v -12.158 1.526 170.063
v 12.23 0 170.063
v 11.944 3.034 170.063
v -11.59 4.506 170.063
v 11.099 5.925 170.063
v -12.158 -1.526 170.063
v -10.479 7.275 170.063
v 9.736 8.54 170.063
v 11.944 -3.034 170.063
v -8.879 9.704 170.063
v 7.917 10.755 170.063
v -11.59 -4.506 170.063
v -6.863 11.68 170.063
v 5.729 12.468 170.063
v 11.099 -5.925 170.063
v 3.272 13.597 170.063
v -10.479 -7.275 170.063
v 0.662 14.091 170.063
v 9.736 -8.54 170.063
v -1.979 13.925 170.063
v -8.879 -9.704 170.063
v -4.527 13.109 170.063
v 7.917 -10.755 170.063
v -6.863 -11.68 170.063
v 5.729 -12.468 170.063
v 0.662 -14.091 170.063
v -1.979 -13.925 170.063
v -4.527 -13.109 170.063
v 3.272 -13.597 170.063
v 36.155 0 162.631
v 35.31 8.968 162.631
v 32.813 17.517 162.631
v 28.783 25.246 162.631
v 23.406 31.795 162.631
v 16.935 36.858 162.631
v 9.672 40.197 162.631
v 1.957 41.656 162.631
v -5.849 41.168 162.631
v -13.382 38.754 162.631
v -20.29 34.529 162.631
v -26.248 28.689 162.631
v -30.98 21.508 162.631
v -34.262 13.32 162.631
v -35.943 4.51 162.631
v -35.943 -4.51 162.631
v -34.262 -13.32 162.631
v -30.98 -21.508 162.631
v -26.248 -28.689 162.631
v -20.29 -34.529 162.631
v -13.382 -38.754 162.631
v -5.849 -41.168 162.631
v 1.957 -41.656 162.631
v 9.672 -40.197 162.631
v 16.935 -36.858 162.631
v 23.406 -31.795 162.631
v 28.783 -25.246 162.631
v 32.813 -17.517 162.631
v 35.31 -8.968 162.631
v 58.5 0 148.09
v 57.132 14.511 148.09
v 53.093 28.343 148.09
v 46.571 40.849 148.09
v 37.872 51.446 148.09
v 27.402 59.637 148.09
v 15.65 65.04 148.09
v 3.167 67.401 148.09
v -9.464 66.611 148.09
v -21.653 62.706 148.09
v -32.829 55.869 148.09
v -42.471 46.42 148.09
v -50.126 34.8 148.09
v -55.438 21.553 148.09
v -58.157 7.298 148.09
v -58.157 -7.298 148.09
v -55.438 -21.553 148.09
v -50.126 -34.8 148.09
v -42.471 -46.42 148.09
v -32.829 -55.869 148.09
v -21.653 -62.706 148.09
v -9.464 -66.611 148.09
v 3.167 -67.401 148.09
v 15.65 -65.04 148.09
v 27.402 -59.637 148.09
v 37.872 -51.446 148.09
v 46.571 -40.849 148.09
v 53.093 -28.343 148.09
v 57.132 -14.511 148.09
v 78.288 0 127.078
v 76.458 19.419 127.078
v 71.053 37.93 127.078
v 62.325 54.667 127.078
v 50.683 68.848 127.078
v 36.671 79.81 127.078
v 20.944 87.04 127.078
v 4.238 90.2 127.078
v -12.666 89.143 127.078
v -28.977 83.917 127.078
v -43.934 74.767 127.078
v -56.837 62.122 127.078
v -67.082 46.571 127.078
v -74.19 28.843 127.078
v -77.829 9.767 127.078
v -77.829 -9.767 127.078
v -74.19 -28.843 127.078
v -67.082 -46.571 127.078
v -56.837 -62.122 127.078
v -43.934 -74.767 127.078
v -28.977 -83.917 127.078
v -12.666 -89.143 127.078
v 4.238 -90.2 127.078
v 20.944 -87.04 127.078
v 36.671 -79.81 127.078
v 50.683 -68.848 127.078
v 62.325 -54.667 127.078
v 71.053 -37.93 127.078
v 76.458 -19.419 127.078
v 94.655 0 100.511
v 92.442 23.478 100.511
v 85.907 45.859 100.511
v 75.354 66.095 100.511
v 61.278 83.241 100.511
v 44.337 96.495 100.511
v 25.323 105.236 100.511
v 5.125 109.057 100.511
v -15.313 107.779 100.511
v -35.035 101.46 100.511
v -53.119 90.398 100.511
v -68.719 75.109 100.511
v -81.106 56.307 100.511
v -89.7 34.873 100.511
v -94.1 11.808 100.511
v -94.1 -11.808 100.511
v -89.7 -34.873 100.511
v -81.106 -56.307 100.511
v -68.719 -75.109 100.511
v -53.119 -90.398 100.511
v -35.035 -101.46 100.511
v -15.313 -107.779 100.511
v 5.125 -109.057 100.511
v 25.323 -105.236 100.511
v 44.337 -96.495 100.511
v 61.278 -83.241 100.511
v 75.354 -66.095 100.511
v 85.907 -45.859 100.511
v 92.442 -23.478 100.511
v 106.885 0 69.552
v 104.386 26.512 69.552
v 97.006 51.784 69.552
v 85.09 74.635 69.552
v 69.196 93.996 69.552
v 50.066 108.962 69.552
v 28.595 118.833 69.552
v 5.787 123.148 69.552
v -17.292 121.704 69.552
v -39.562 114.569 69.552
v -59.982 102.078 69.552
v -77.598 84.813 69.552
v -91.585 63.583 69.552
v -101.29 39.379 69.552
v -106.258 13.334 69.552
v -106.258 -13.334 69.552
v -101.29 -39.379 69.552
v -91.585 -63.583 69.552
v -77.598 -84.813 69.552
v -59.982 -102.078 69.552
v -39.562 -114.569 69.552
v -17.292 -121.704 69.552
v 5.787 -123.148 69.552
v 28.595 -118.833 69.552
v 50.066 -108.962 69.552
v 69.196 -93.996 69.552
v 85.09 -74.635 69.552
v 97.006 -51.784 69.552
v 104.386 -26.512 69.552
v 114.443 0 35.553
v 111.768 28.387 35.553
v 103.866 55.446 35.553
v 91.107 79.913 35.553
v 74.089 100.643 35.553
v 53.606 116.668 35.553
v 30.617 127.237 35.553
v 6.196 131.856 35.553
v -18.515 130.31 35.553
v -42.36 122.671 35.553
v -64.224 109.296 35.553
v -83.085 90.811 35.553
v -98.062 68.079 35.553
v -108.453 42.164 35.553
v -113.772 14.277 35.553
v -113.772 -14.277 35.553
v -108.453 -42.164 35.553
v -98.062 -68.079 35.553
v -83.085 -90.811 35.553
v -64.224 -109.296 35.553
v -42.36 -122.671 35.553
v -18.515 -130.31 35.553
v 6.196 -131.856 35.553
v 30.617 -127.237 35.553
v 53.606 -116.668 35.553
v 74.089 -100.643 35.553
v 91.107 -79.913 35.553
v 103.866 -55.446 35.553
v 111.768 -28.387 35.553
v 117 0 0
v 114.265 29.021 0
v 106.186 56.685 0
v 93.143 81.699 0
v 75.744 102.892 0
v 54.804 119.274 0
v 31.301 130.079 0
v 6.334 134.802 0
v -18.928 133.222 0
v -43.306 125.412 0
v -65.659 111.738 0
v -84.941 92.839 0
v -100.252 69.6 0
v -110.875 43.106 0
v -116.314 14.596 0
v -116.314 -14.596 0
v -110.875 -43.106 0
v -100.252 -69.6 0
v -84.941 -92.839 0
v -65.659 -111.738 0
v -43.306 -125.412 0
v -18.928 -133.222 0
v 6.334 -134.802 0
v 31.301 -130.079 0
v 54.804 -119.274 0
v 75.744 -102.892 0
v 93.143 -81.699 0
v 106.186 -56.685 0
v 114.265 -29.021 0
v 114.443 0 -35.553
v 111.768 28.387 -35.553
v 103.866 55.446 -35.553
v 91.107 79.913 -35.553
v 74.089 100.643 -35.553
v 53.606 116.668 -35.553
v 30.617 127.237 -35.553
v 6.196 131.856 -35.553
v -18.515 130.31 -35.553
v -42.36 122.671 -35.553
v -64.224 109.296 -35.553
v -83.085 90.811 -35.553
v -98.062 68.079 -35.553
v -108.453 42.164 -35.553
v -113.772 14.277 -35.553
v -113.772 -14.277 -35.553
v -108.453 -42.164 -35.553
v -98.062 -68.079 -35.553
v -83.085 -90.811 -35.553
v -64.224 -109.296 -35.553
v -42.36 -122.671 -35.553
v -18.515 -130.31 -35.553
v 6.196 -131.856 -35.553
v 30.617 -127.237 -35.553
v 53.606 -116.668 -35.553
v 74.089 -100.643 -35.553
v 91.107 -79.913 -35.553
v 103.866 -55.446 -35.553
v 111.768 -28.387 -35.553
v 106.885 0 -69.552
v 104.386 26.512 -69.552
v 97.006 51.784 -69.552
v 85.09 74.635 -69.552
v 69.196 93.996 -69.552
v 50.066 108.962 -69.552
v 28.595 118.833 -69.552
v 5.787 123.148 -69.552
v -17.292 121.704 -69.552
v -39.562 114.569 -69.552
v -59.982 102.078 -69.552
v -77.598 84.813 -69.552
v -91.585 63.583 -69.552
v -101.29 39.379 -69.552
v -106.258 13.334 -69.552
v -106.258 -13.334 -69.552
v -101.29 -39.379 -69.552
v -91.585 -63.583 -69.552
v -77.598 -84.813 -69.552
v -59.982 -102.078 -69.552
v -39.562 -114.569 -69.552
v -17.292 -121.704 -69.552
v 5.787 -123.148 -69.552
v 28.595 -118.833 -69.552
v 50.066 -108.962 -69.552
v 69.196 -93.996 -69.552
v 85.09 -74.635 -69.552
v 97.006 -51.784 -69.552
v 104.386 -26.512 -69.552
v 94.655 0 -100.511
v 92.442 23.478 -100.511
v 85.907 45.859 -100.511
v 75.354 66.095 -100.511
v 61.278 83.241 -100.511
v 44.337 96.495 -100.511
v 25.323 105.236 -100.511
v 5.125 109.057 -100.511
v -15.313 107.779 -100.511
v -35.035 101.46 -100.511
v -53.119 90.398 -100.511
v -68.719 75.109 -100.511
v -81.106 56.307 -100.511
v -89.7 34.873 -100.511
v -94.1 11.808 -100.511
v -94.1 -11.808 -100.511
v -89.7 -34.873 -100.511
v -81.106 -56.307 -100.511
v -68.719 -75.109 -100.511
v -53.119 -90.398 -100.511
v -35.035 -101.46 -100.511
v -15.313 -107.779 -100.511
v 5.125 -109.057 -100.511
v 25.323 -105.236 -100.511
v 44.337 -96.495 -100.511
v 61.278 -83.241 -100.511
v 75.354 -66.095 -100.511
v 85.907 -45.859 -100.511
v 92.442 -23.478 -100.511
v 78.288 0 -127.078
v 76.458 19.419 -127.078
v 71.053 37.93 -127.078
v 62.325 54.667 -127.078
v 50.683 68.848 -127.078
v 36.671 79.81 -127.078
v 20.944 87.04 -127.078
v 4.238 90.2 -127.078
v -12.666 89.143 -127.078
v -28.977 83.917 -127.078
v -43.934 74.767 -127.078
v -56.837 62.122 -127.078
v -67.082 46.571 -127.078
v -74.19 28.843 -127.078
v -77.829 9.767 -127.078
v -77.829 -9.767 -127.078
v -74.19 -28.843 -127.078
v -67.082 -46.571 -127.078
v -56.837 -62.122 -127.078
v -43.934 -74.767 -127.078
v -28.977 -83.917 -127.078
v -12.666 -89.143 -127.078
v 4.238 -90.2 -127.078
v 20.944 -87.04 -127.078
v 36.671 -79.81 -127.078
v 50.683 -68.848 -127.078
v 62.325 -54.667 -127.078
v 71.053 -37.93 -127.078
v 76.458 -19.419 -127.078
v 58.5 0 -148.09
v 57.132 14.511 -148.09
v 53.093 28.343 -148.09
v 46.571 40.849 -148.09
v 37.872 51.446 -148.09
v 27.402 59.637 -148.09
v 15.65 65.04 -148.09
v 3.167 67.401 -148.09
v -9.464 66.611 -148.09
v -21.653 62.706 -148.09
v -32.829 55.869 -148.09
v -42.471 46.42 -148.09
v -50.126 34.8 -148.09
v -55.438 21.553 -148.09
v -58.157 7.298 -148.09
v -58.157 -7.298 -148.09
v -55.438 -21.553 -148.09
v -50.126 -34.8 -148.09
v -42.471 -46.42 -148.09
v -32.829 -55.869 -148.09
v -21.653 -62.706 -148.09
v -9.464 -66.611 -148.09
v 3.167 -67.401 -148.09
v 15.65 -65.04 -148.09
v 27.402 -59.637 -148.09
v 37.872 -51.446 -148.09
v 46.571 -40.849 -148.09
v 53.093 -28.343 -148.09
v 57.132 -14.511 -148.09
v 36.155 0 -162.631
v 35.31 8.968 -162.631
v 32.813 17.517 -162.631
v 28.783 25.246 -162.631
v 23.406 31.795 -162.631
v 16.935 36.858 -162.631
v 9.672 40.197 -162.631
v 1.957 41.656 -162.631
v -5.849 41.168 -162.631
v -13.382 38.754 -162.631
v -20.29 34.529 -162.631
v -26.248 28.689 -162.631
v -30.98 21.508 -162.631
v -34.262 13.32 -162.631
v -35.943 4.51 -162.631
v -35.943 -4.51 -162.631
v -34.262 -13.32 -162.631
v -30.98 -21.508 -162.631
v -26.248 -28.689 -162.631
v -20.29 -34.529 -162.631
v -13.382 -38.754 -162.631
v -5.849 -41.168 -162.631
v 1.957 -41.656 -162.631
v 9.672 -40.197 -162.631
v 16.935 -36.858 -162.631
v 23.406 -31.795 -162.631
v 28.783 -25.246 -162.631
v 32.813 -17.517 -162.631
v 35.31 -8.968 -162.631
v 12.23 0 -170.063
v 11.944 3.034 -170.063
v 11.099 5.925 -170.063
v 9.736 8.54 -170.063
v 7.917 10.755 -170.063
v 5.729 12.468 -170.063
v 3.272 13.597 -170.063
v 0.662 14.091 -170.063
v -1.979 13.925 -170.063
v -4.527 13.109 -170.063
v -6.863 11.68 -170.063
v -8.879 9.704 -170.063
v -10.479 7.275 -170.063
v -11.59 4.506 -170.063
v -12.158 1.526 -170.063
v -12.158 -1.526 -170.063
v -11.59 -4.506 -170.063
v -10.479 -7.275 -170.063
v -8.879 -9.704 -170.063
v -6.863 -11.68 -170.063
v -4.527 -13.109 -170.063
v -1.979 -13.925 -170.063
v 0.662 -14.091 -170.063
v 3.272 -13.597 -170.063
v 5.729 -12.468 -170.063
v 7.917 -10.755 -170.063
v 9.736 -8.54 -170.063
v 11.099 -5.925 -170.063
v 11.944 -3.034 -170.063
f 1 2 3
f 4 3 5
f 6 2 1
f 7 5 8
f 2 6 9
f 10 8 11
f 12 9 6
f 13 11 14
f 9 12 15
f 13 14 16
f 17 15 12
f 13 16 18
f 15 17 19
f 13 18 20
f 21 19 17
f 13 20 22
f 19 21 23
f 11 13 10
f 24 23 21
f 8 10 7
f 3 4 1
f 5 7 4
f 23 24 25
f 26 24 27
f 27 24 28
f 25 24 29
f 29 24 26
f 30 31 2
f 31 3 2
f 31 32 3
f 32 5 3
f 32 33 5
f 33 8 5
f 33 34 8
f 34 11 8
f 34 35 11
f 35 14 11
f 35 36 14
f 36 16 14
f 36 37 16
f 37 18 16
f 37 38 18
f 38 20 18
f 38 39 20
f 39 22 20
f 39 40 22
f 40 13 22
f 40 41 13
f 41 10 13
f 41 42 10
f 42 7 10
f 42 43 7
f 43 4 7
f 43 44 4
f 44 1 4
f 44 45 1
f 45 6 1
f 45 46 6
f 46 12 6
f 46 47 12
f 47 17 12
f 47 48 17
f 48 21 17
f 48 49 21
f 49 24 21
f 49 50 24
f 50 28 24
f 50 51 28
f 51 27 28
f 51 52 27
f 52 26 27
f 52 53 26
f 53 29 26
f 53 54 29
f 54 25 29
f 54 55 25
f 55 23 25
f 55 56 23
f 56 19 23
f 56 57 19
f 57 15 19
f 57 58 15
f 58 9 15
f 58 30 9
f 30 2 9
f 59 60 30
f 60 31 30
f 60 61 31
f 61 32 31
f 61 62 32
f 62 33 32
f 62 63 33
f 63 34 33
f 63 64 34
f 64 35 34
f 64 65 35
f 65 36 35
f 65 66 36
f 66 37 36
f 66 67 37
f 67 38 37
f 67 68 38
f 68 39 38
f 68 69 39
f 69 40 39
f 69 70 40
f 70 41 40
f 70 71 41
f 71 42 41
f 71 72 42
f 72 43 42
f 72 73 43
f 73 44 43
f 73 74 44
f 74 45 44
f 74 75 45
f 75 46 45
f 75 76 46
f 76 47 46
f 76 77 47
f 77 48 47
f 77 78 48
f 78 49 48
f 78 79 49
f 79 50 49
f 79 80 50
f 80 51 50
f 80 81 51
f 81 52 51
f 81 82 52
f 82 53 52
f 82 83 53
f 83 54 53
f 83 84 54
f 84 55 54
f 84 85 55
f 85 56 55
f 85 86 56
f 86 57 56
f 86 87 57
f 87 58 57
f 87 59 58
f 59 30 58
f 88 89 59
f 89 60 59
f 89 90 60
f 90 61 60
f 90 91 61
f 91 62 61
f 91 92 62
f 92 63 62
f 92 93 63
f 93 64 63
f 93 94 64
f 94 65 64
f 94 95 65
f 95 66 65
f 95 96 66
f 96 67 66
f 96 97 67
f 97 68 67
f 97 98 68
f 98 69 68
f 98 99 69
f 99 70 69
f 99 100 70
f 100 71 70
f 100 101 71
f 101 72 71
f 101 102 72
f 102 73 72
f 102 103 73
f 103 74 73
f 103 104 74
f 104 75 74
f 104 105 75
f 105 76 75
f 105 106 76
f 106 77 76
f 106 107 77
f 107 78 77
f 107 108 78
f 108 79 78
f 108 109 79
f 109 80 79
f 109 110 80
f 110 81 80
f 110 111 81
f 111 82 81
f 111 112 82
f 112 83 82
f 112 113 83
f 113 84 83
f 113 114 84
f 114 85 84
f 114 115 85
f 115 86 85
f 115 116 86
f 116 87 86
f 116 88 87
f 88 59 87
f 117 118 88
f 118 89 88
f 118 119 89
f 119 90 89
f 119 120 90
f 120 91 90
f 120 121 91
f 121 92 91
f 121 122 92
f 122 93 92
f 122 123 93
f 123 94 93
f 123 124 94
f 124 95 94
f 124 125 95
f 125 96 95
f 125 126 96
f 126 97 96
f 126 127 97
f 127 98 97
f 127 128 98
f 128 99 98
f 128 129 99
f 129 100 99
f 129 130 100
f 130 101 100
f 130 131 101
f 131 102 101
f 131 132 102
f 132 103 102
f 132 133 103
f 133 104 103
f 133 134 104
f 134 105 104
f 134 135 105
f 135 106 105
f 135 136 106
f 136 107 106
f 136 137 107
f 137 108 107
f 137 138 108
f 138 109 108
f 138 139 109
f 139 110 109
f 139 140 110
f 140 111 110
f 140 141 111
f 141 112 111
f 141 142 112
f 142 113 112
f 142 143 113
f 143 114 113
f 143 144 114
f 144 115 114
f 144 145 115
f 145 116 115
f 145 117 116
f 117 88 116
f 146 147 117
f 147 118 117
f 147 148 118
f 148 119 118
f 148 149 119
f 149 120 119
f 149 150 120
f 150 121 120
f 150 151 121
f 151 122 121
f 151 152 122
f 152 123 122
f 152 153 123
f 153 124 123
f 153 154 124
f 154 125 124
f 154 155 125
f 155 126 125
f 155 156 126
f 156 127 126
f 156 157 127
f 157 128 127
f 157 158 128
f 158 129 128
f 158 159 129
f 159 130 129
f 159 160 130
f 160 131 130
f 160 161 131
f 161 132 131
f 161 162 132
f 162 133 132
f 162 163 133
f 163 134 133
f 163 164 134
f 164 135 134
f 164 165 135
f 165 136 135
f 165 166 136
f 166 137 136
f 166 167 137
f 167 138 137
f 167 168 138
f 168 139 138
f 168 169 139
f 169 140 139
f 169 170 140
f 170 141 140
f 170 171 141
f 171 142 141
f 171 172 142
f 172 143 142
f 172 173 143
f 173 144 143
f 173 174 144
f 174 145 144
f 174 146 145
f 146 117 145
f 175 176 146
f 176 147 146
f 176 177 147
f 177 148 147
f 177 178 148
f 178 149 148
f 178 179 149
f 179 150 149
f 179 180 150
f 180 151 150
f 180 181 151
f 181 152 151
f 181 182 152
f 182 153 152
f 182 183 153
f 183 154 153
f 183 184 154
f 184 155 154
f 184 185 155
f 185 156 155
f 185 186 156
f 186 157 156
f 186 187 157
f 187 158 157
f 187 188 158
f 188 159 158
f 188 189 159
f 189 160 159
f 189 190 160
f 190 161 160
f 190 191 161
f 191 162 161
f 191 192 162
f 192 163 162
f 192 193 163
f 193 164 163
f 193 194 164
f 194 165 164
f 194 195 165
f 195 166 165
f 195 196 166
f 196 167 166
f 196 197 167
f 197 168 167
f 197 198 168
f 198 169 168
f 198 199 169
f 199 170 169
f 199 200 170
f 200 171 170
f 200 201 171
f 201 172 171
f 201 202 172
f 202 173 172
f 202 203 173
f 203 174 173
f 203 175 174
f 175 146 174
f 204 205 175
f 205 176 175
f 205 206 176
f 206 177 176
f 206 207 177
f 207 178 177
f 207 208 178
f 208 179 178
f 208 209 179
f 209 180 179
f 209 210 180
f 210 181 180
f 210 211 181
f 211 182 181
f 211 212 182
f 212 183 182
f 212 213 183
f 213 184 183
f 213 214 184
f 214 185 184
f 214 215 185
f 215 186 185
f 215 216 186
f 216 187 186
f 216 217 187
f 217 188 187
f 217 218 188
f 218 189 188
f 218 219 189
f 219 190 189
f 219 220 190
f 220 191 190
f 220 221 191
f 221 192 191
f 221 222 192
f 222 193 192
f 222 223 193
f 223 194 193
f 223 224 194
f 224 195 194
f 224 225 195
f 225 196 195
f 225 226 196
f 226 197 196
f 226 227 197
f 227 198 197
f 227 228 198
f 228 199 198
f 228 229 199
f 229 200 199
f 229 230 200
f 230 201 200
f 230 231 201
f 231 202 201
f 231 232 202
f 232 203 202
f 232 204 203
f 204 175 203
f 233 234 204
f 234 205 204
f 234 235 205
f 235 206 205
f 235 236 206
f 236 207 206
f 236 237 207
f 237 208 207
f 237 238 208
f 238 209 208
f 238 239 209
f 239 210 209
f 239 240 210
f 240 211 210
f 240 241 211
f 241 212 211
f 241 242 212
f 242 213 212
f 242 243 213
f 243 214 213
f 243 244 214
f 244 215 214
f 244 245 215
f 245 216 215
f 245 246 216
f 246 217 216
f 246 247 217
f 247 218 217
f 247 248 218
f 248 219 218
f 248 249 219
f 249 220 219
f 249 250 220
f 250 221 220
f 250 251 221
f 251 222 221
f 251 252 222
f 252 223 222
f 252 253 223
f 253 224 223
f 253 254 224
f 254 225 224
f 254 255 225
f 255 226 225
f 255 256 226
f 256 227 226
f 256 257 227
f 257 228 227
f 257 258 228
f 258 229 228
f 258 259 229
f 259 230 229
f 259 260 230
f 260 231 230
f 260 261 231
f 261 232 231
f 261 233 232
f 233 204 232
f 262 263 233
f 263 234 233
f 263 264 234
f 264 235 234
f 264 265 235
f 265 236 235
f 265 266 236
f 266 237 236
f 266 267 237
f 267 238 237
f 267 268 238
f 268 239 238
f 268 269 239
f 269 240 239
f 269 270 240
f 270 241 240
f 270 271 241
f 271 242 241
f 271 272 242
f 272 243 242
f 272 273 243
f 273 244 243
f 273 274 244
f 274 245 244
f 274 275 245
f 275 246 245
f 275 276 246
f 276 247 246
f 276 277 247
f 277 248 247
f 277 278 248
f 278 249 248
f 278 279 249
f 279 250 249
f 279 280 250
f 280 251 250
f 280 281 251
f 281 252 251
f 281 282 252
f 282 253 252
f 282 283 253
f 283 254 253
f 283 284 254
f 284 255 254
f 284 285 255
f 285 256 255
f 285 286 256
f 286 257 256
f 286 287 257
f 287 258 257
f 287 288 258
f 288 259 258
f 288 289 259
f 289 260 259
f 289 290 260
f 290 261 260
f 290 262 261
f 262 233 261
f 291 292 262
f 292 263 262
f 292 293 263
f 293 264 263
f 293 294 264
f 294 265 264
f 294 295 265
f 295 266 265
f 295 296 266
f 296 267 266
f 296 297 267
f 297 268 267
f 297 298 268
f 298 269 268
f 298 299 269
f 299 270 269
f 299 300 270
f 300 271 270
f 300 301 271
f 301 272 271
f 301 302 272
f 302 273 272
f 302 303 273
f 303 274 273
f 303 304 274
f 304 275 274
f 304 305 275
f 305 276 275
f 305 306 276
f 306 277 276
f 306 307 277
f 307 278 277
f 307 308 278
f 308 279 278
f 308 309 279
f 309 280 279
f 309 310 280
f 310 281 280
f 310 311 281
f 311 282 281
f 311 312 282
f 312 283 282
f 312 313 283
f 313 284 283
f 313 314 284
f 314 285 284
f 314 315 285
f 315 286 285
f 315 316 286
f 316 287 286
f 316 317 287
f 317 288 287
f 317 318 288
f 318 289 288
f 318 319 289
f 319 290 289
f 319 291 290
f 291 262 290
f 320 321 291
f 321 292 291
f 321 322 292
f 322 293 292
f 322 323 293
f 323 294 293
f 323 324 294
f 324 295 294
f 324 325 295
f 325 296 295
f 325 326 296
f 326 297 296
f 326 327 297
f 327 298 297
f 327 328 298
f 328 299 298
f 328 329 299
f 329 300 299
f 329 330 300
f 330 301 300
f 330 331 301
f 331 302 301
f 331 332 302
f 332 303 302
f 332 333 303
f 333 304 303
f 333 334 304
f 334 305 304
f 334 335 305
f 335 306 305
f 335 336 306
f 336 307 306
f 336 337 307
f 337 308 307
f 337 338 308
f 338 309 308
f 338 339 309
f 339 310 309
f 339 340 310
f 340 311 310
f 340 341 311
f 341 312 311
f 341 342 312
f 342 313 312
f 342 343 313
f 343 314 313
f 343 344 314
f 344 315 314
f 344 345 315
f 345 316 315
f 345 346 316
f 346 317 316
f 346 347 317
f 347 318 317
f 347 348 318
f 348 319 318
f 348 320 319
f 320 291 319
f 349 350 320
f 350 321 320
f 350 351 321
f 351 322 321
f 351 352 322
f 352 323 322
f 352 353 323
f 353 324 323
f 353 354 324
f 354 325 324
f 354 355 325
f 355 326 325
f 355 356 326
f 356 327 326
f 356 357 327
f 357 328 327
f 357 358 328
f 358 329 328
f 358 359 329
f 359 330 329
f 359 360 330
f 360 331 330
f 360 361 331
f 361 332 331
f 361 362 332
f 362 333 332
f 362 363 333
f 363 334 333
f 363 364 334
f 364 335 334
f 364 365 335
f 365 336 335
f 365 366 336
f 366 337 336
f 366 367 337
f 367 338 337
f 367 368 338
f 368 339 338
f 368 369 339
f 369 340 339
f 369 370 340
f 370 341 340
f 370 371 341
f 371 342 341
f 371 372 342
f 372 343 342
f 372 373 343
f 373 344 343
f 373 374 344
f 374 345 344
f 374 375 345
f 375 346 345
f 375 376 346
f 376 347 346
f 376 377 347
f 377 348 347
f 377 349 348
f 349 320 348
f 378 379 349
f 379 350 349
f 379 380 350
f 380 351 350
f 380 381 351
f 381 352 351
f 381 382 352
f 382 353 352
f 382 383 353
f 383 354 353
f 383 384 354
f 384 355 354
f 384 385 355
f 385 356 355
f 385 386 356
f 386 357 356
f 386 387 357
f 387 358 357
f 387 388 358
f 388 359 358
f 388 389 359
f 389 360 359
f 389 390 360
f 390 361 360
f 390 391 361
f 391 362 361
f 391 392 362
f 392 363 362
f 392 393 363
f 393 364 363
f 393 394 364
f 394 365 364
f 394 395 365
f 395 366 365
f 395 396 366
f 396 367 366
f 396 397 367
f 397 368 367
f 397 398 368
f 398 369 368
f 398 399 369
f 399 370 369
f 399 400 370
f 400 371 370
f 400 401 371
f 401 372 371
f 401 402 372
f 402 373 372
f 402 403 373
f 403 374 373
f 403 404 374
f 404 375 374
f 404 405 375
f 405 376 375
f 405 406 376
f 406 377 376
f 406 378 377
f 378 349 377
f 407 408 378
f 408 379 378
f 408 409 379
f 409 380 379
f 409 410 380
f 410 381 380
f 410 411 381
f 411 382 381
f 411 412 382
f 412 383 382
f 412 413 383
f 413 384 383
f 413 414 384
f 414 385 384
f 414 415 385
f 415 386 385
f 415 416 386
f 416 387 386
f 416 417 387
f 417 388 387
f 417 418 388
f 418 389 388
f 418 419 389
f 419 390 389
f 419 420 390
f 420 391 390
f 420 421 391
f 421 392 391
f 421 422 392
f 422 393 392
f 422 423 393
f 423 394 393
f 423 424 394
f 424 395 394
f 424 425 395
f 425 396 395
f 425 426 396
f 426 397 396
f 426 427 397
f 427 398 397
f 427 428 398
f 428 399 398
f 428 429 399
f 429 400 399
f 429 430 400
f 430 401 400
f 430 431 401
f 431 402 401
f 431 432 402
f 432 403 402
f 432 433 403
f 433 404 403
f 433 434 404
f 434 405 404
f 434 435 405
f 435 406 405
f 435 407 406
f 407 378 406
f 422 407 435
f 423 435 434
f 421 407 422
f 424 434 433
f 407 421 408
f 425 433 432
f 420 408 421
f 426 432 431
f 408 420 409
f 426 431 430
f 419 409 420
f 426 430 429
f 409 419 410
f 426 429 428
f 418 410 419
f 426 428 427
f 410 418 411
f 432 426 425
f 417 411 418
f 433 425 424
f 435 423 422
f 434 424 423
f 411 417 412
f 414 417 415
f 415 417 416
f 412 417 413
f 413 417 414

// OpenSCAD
// Generated by SolidPython 1.0.1 on 2020-07-29 00:46:51


scale(v = [13, 15, 19]) {
	sphere(r = 9);
}
/***********************************************
*********      SolidPython code:      **********
************************************************
 
# import packages: SolidPython
from solid import *
from solid.utils import *
from itertools import chain, combinations, permutations


class Resize:

    def __init__(self, scad_file):
        self.scad_file = scad_file
        #self.scad_file = import_scad(scad_file)
        # cone/cylinder param:
        self.r1 = 0
        self.r2 = 0
        self.h = 0
        # rectangular prism param:
        self.w = 0
        self.l = 0
        # ellipse param:
        self.r = 0

    # import OpenScad code (file name corresponds to shape)


    # classify shape + parameters
    def assign(self, param1, param2, param3):
        if self.scad_file == 'cone.scad':
            self.r1 = param1
            self.r2 = param2
            self.h = param3
        elif self.scad_file == 'cylinder.scad':
            self.r1 = param1
            self.r2 = param2
            self.h = param3
        elif self.scad_file == 'rectangularPrism.scad':
            self.h = param1
            self.l = param2
            self.w = param3
        else:
            self.r = param1
            self.h = param2

    # resize parameters
    def iterate(self):
        x = range(3, 20, 2)
        i = 1
        if self.scad_file == 'cone.scad':
            tempList = list(permutations(x, 2))
            for temp in tempList:
                param1 = temp[0]
                param2 = temp[1]
                filepath = 'produced_scad_files/' + 'cone' + str(param1) + '_' + str(param2) + '_' + '.scad'
                scad_render_to_file(cylinder(h=param1, r1=param2, r2=0), filepath)

        elif self.scad_file == 'cylinder.scad':
            tempList = list(permutations(x, 3))
            for temp in tempList:
                param1 = temp[0]
                param2 = temp[1]
                filepath = 'produced_scad_files/' + 'cylinder' + str(param1) + '_' + str(param2) + '_' + '.scad'
                scad_render_to_file(cylinder(h=param1, r1=param2, r2=param2), filepath)

        elif self.scad_file == 'rectangularPrism.scad':
            tempList = list(permutations(x, 3))
            for temp in tempList:
                param1 = temp[0]
                param2 = temp[1]
                param3 = temp[2]
                filepath = 'produced_scad_files/' + 'rectangularPrism' + str(param1) + '_' + str(param2) + '_' + str(
                    param3) + '.scad'
                scad_render_to_file(cube(size=(param1, param2, param3)), filepath)

        elif self.scad_file == 'ellipse.scad':
            tempList = list(permutations(x, 4))
            for temp in tempList:
                param1 = temp[0]
                param2 = temp[1]
                param3 = temp[2]
                param4 = temp[3]
                filepath = 'produced_scad_files/' + 'ellipse' + str(param1) + '_' + str(param2) + '_' + str(param3) + '_' + str(param4) + '.scad'
                scad_render_to_file(scale([param1, param2, param3])(sphere(r=param4)), filepath)

    def render_to_scadfile(self):
        scad_render_to_file(scad, 'example.scad') 
 
************************************************/
